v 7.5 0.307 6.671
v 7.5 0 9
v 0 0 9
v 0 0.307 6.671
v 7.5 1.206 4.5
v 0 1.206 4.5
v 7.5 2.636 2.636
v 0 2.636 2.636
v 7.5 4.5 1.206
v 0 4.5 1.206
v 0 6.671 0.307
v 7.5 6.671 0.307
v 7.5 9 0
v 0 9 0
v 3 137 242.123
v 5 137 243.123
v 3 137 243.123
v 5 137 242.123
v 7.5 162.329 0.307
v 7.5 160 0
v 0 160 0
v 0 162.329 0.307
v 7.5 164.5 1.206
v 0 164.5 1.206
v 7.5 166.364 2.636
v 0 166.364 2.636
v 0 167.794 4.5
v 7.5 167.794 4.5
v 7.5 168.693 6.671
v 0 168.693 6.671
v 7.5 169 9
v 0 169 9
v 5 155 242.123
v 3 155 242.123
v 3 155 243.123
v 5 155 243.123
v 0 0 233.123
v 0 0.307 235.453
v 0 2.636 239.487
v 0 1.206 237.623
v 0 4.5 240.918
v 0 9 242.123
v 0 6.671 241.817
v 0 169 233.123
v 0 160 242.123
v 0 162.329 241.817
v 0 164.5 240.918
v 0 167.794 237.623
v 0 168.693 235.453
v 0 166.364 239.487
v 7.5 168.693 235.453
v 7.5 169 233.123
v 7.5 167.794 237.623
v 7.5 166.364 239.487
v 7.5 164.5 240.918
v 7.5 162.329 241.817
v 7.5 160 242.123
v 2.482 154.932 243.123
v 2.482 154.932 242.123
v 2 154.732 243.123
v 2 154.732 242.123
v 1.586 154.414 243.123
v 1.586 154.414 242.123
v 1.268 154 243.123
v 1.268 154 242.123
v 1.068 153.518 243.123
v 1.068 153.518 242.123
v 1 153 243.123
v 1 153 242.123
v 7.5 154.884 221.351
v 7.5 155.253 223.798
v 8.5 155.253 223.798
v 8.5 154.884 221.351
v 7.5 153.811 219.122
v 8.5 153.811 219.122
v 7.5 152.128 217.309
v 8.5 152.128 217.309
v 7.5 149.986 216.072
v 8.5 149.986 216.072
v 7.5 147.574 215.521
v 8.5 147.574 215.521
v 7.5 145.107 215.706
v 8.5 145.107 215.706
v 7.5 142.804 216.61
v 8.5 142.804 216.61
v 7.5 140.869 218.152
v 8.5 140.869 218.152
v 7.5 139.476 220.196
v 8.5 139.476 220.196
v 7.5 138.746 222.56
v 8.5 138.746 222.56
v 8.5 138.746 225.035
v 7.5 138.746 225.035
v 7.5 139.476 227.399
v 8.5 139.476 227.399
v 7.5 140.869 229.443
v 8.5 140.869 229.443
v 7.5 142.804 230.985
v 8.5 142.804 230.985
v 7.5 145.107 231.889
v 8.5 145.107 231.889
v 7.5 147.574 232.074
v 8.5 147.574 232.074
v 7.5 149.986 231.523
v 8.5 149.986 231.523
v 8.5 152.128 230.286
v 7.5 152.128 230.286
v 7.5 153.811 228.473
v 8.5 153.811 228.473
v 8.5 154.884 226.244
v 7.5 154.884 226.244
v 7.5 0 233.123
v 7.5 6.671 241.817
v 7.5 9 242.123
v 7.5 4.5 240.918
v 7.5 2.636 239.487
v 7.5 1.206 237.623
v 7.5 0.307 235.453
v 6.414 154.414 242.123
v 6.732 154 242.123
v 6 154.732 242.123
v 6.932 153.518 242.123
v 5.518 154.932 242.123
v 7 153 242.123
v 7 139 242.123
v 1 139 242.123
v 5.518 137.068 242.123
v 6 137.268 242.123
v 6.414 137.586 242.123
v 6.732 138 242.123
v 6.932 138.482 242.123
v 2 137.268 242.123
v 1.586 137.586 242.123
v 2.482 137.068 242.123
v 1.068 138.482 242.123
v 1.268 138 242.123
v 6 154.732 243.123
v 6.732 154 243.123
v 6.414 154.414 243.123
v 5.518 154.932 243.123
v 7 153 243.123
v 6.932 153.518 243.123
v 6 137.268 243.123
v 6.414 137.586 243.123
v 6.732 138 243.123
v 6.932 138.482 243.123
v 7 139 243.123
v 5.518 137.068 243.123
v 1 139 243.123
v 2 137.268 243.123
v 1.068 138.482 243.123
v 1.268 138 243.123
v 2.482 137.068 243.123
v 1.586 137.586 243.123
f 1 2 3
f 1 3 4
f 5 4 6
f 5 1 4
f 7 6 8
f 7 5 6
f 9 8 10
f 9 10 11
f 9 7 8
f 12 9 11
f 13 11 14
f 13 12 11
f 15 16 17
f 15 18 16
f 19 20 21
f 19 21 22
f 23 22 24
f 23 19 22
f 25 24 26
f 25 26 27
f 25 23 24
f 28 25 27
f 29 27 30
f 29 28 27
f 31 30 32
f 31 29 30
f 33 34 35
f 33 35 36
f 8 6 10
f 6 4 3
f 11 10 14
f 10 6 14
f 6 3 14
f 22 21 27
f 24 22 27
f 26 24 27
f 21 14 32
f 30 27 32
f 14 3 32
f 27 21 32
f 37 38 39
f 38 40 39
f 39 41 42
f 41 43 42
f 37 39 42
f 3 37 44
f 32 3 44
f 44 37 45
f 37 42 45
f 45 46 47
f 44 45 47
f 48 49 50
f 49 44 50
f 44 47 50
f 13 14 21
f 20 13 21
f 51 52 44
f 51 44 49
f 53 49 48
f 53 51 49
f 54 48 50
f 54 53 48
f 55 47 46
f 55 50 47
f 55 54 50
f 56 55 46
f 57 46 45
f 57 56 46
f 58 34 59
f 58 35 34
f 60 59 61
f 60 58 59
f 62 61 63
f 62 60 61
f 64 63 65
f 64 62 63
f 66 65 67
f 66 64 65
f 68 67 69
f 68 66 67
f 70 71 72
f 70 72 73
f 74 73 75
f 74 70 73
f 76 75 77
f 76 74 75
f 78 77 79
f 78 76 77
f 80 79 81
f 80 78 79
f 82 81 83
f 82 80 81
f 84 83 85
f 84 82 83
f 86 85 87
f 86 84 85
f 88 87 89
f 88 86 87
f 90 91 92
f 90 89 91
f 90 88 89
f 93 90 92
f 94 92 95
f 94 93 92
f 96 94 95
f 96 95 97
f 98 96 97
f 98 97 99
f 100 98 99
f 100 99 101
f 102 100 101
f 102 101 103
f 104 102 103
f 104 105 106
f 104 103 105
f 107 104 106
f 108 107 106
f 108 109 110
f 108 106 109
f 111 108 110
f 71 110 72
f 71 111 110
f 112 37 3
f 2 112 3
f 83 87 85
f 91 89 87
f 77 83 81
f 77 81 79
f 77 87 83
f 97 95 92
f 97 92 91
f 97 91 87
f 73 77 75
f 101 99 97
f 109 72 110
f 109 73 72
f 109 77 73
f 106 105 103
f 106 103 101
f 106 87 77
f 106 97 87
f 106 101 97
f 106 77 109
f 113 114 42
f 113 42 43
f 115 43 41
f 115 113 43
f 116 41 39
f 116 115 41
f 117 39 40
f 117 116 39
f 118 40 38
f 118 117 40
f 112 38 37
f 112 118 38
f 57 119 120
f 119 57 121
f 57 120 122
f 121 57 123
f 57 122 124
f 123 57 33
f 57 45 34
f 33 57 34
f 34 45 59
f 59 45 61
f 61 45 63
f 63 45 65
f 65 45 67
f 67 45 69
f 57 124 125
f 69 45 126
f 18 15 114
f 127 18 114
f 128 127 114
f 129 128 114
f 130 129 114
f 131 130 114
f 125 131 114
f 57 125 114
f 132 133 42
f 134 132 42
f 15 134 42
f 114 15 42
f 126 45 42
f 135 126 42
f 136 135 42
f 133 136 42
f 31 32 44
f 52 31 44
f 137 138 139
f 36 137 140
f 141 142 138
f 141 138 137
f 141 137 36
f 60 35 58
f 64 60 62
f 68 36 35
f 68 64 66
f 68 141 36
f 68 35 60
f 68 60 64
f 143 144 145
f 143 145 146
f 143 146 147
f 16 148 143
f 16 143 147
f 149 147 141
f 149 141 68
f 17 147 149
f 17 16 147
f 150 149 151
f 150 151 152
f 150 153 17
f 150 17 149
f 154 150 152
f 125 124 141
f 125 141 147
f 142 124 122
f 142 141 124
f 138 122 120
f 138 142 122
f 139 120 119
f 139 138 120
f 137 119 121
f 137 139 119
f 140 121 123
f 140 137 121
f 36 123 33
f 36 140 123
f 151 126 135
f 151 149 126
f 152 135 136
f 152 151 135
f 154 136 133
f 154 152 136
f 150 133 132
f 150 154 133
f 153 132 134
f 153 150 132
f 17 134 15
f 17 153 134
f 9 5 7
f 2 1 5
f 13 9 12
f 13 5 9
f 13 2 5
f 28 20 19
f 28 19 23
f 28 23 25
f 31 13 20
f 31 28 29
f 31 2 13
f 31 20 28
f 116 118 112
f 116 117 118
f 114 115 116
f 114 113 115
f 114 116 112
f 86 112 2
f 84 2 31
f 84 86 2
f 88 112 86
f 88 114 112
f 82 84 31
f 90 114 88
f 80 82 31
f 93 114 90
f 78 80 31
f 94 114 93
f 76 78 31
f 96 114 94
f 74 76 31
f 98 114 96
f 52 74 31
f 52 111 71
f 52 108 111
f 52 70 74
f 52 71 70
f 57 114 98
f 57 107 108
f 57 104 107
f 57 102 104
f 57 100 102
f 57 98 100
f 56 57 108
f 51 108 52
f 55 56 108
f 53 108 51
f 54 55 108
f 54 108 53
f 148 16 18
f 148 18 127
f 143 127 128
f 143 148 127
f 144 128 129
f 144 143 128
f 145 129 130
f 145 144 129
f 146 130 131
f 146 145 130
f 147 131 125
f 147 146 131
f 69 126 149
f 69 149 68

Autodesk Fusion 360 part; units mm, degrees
sketch "Sketch1" plane through (0, 0, 0) normal (1, 0, 0) x (0, 1, 0)
  line L0 (0, 0) -> (169, 0)
  line L1 (169, 0) -> (169, 242.1233)
  line L2 (169, 242.1233) -> (0, 242.1233)
  line L3 (0, 242.1233) -> (0, 0)
  dimension "d1" = 169
extrude "Extrude1" add sketch "Sketch1" along normal blind 7.5
sketch "Sketch2" plane through (0, 0, 0) normal (-1, 0, 0) x (0, -1, 0)
  line L0 (0, 0) -> (0, 242.1233)
  line L1 (0, 242.1233) -> (-169, 242.1233)
  line L2 (-169, 242.1233) -> (-169, 0)
  line L3 (-169, 0) -> (0, 0)
fillet "Fillet1" radius 9 1 edges at (3.75, 0, 242.1233)
fillet "Fillet2" radius 9 1 edges at (3.75, 169, 242.1233)
fillet "Fillet3" radius 9 1 edges at (3.75, 0, 0)
fillet "Fillet4" radius 9 1 edges at (3.75, 169, 0)
sketch "Sketch3" plane through (0, 0, 0) normal (-1, 0, 0) x (0, -1, 0)
  circle A0 centre (-85, 235) radius 5
sketch "Sketch4" plane through (0, 0, 0) normal (-1, 0, 0) x (0, -1, 0)
  circle A0 centre (-84.9515, 235.215) radius 0
sketch "Sketch5" plane through (0, 0, 0) normal (-1, 0, 0) x (0, -1, 0)
  circle A0 centre (-85.1812, 235.1149) radius 3
  dimension "d8" = 6
sketch "Sketch6" plane through (0, 0, 0) normal (-1, 0, 0) x (0, -1, 0)
  line L0 (-10, 230) -> (-160, 230)
  line L1 (-160, 230) -> (-160, 10)
  line L2 (-160, 10) -> (-10, 10)
  line L3 (-10, 10) -> (-10, 230)
sketch "Sketch7" plane through (0, 0, 0) normal (-1, 0, 0) x (0, -1, 0)
sketch "Sketch8" plane through (0, 0, 0) normal (-1, 0, 0) x (0, -1, 0)
sketch "Sketch9" plane through (0, 0, 0) normal (-1, 0, 0) x (0, -1, 0)
sketch "Sketch10" plane through (0, 0, 0) normal (-1, 0, 0) x (0, -1, 0)
sketch "Sketch11" plane through (0, 0, 0) normal (0, 0, -1) x (1, 0, 0)
  line L0 (0, -160) -> (7.5, -160)
  line L1 (7.5, -160) -> (7.5, -9)
  line L2 (7.5, -9) -> (0, -9)
  line L3 (0, -9) -> (0, -160)
sketch "Sketch12" plane through (0, 0, 242.1233) normal (0, 0, 1) x (-1, 0, 0)
  line L0 (-7.5, -160) -> (0, -160)
  line L1 (0, -160) -> (0, -9)
  line L2 (0, -9) -> (-7.5, -9)
  line L3 (-7.5, -9) -> (-7.5, -160)
  line L4 (-1, -155) -> (-7, -155)
  line L5 (-7, -155) -> (-7, -137)
  line L6 (-7, -137) -> (-1, -137)
  line L7 (-1, -137) -> (-1, -155)
extrude "Extrude2" add sketch "Sketch12" along normal blind 1 contours L4 L5 L6 L7
fillet "Fillet5" radius 2 1 edges at (1, 155, 242.6233)
fillet "Fillet6" radius 2 1 edges at (7, 155, 242.6233)
fillet "Fillet7" radius 2 1 edges at (1, 137, 242.6233)
fillet "Fillet8" radius 2 1 edges at (7, 137, 242.6233)
sketch "Sketch13" plane through (7.5, 0, 0) normal (1, 0, 0) x (0, 1, 0)
  arc A0 (160, 0) -> (169, 9) centre (160, 9) ccw
  line L0 (169, 9) -> (169, 233.1233)
  arc A1 (169, 233.1233) -> (160, 242.1233) centre (160, 233.1233) ccw
  line L1 (160, 242.1233) -> (9, 242.1233)
  arc A2 (9, 242.1233) -> (0, 233.1233) centre (9, 233.1233) ccw
  line L2 (0, 233.1233) -> (0, 9)
  arc A3 (0, 9) -> (9, 0) centre (9, 9) ccw
  line L3 (9, 0) -> (160, 0)
  circle A4 centre (146.9534, 223.7975) radius 8.2997
  circle A5 centre (147.3608, 209.8046) radius 2.0283
  dimension "d15" = 16.5995
extrude "Extrude3" add sketch "Sketch13" along normal blind 1 contours A4
